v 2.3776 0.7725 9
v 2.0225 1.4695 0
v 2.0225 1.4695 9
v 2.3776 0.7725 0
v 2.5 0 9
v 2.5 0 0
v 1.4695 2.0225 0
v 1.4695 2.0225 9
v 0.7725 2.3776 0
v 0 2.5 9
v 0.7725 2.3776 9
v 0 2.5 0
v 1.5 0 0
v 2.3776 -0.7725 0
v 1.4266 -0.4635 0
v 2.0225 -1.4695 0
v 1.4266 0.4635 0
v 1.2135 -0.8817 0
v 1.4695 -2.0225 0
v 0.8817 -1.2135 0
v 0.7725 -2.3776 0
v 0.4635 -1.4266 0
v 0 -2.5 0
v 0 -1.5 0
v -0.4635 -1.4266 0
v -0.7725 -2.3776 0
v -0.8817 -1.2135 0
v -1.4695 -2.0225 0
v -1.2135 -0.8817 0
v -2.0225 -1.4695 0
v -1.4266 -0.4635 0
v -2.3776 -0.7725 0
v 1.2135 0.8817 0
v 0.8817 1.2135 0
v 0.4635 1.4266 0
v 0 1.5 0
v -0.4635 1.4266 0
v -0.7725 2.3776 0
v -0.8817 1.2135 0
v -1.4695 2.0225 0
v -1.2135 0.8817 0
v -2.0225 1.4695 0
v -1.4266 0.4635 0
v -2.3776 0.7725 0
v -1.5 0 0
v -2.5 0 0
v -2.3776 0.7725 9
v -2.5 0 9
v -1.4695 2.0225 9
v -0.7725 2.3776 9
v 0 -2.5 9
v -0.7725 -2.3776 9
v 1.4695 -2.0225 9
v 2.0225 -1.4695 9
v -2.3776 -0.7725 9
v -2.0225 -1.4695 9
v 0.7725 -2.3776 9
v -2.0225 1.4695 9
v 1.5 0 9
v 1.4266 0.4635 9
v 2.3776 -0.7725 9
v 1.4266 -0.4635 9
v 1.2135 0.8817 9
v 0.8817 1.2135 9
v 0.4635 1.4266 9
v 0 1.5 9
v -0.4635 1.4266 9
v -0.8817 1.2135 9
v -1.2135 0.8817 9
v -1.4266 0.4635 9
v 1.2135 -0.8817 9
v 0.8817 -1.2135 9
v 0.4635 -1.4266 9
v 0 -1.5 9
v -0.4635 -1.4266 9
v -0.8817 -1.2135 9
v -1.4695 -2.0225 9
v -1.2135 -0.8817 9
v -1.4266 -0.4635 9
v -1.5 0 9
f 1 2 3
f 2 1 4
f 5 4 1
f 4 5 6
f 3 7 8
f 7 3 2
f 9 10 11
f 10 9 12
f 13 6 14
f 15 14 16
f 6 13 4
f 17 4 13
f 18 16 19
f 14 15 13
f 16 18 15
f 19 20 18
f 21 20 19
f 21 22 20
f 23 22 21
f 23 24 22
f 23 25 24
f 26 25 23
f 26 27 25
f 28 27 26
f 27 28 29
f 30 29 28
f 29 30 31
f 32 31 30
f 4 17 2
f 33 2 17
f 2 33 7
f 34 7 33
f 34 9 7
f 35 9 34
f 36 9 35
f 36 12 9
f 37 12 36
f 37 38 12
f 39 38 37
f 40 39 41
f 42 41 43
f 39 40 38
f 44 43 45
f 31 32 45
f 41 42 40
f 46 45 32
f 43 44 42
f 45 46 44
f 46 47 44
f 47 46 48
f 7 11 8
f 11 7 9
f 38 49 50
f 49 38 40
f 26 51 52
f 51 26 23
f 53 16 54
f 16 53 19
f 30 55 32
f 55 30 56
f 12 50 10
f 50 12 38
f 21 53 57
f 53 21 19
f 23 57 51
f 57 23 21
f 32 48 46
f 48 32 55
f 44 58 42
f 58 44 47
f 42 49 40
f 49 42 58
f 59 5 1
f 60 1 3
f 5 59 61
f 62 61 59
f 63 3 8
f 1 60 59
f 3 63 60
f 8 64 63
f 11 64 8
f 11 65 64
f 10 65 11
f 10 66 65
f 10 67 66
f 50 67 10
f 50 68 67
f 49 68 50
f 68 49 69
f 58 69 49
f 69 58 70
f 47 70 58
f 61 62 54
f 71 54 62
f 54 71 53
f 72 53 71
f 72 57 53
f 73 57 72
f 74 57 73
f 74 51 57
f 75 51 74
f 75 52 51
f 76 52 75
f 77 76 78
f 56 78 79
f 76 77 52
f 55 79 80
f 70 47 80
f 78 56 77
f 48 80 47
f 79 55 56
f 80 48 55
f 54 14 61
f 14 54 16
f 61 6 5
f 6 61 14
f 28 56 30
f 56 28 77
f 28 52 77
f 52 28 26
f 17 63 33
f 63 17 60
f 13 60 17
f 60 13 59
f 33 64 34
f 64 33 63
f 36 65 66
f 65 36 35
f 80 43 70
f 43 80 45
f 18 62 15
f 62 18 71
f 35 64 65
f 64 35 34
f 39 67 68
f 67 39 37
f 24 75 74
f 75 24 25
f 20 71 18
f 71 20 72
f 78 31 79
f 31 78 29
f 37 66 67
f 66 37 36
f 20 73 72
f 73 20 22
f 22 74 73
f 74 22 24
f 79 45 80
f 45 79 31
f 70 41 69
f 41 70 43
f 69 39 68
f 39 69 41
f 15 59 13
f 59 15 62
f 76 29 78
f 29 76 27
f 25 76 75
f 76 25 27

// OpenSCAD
BASE_THICKNESS = 1;
PIMB_L = 85;
PIMB_W = 56.0;
PIMB_H = 1.45;
PIMB_R = 3;
PIMB_MARGINS = 3;
PIMB_SCREWS_POS = [
    [-PIMB_L / 2 + 22.5, -PIMB_W/2 + 3.5, [180]],
    [PIMB_L / 2 - 3.5, -PIMB_W/2 + 3.5, [180, 225, 270]],
    [-PIMB_L / 2 + 22.5, PIMB_W/2 - 3.5, [0]],
    [PIMB_L / 2 - 3.5, PIMB_W/2 - 3.5, [0, 315, 270]],
];
PIMB_CONNECTOR_HOLE = [
    // x, y, width, height
    [PIMB_L / 2 - 10.6, PIMB_W / 2, 10, 7],
    [-PIMB_L / 2, PIMB_W / 2 - 10.25, 16, 15],
];
PIMB_SCREWS_M = 2.5;
PIMB_SCREWS_LENGTH = BASE_THICKNESS * 5; // from outside of base
PIMB_NUT_HEIGHT = 1;
DIGIT_L = 25;
DIGIT_W = 18;
DIGIT_X = -27;
DIGIT_Y = 1.5;
DIGIT_SPACE = 1;
CAMERA_R = 7;
CAMERA_SPACE = 1;
CAMERA_X = 12;
CAMERA_Y = -17;
CAMERA_SCREWS_X = [21 / 2, -21 / 2];
CAMERA_SCREWS_Y = [13.5 / 2, -13.5 / 2];
CAMERA_SCREWS_LENGTH = 14.5; // from outside of base
CAMERA_NUT_HEIGHT = 1;
CAMERA_SCREWS_M = 2;

BOX_WALLS = 1;
BOX_RIDGE = 2;
BOX_HEIGHT = 39;

PIMB_UNDER_BOARD_SPACE = 3; // space for sunken screw heads
PIMB_SCREW_PADS_R = 3.5; // actually they're more like 3, but there is some extra space
PIMB_SCREW_HEAD_R = 2.7;
SCREW_HOLE_FACTOR = 1.2; // if screw is M2, make size of hole this much larger
BOX_NR_AIRHOLES_X = 4;
BOX_NR_AIRHOLES_Y = 5;
BOX_AIRHOLE_WIDTH = 3;
BOX_AIRHOLE_HEIGHT = 17;
BOX_AIRHOLE_MARGIN = 10;

SPACER_MB_POE_LENGTH = 15;
SPACER_POE_PROTO_LENGTH = 9;
TOP_TO_BOTTOM_HEIGHT = 28;

MAGNET_R = 7.5;
MAGNET_H = 2.2;
BOX_ROTATION_FROM_VERTICAL = 15;

$fn=20;
function enforce_3_vector(x) = is_list(x) ? x : [x, x, x];

module rounded_corner_cube(dimensions, r=0) {
    dimensions = enforce_3_vector(dimensions);
    r = enforce_3_vector(r);
    up(dimensions.z / 2) {
        minkowski() {
            cube(dimensions - 2 * r, center=true);
            scale(r) sphere(r=1);
        }
    }
}

module MB_no_holes () {
    linear_extrude(PIMB_H) {
        minkowski() {
            square([PIMB_L-2 * PIMB_R, PIMB_W - 2 * PIMB_R], center=true);
            circle(PIMB_R);
        }
    }
}
module MB() {
    difference() {
        MB_no_holes();
        repeat_for_MB_screw_positions() {
            down(1) cylinder(r=PIMB_SCREWS_M / 2, h=PIMB_H + 2);
        }
    }
}

module digit_cutout() {
    translate([DIGIT_X, DIGIT_Y, 0]) {
        cube([DIGIT_L + 2 * DIGIT_SPACE, DIGIT_W + 2 * DIGIT_SPACE, 3 * BASE_THICKNESS], center=true);
    }
}

module camera_cutout() {
    translate([CAMERA_X, CAMERA_Y, 0]) {
        cylinder(r=CAMERA_R + CAMERA_SPACE, h=3 * BASE_THICKNESS, center=true);
    }
}
module camera_screws() {
    translate([CAMERA_X, CAMERA_Y, 0]) {
        for(x=CAMERA_SCREWS_X, y=CAMERA_SCREWS_Y) {
            translate([x, y, 0]) {
                difference() {
                    cylinder(r=CAMERA_SCREWS_M * 1.1 + 1, h=CAMERA_SCREWS_LENGTH);
                    translate([0, 0, BASE_THICKNESS]) cylinder(r=CAMERA_SCREWS_M / 2, h=CAMERA_SCREWS_LENGTH);
                    translate([0, 0, CAMERA_SCREWS_LENGTH - 3 * CAMERA_NUT_HEIGHT]) cylinder(r=CAMERA_SCREWS_M * 1.1 , h=CAMERA_SCREWS_LENGTH, $fn=6);
                }
            }
        }
    }

}


module pimb_screws() {
    repeat_for_MB_screw_positions() {
        difference() {
            cylinder(r=PIMB_SCREWS_M * 1.1 + 1, h=PIMB_SCREWS_LENGTH);
            translate([0, 0, BASE_THICKNESS]) cylinder(r=PIMB_SCREWS_M / 2, h=PIMB_SCREWS_LENGTH);
            translate([0, 0, PIMB_SCREWS_LENGTH - 3 * PIMB_NUT_HEIGHT]) cylinder(r=PIMB_SCREWS_M * 1.1 , h=PIMB_SCREWS_LENGTH, $fn=6);
        }
    }
}

module base() {
    difference() {
        translate([0, 0, BASE_THICKNESS / 2]) {
            cube([400, 200, BASE_THICKNESS], center=true);
        }
        translate([0, -20, -BASE_THICKNESS]) linear_extrude(BASE_THICKNESS * 1.5) voncount();
        digit_cutout();
        camera_cutout();
    }
    camera_screws();
    pimb_screws();
}


module voncount() {
    scale(.1) import(file="voncount.svg", center=true);
}
/*
module hex_grid() {
    CELL_SIZE = 10;
    CELL_WALL_SIZE = 1;
    CELL_SPACE_Y = (CELL_SIZE *sqrt(3) / 2 + CELL_WALL_SIZE) / 2;
    CELL_SPACE_X = CELL_SPACE_Y * sqrt(3) * 2;
    GRID_HEIGHT = 2;
    for (x=[-1:1], y=[-6:6]) {
        x = x + (abs(y) % 2 - .5) / 2;
        translate([x * CELL_SPACE_X, y * CELL_SPACE_Y, 0]) {
            difference() {
                cylinder(r=CELL_SIZE / 2 + CELL_WALL_SIZE * sqrt(3), h=GRID_HEIGHT, $fn=6);
                translate([0, 0, -1]) cylinder(r=CELL_SIZE / 2, h=GRID_HEIGHT + 2, $fn=6);
            }
        }
    }
}
*/

module rotated_front() {
    translate([0, 0, -210]) {
        rotate(25, [0, 0, 1]) {
            rotate(-75, [1, 0, 0]) {
                translate([30, -150, -10]) {
                    union() {
                        translate([0, 0, BASE_THICKNESS * 3]) MB();
                        base();
                    }
                }
            }
        }
    }
}
module rotated_walls() {
    translate([-30, 150, 10]) {
        rotate(75, [1, 0, 0]) {
            rotate(-25, [0, 0, 1]) {
                translate([0, 0, 210]) {
                    translate([0, 0, 500]) cube(1000, center=true);
                    rotate(-90, [1, 0, 0]) translate([0, 0, 500]) cube(1000, center=true);
                    rotate(-90, [0, 1, 0]) translate([0, 0, 500]) cube(1000, center=true);
                }
            }
        }
    }
}

module corner_box() {
    difference() {
        union() {
            translate([0, 0, BASE_THICKNESS * .5]) MB();
            base();
        }
        rotated_walls();
    }
}

module down(z) {
    up(-z) children();
}

module up(z) {
    translate([0, 0, z]) children();
}

module spacers(h, m=2.5, count=4, distance = 0) {
    for (x=[0:count - 1]) {
        translate([x * (distance == 0 ? m * 2 : distance), 0, 0]) {
            difference() {
                cylinder(r=m * 1.2, h=h, $fn=6);
                down(1) cylinder(r=m/2*1.1, h=h + 2);
            }
        }
    }
}

module spacers_loose(h, m=2.5, count=4, distance = 0) {
    for (x=[0:count - 1]) {
        translate([x * (distance == 0 ? m * 2 : distance), 0, 0]) {
            difference() {
                cylinder(r=m, h=h);
                down(1) cylinder(r=m/2*1.2, h=h + 2);
            }
        }
    }
}

module repeat_for_MB_screw_positions() {
    for(x_y_rots=PIMB_SCREWS_POS) {
        x = x_y_rots[0];
        y = x_y_rots[1];
        for (rot=x_y_rots[2]) {
            translate([x, y, 0]) rotate([0, 0, rot]) children();
        }
    }
}

module make_MB_base_holes_and_support() {
    difference() {
        union() {
            children();
            repeat_for_MB_screw_positions() {
                translate([-PIMB_SCREW_PADS_R, 0, 0]) cube([PIMB_SCREW_PADS_R * 2, PIMB_SCREW_PADS_R * 2 + 10, BOX_WALLS + PIMB_UNDER_BOARD_SPACE]);
                cylinder(r=PIMB_SCREW_PADS_R, h=BOX_WALLS + PIMB_UNDER_BOARD_SPACE);
            }
        }
        repeat_for_MB_screw_positions() {
            down(BOX_WALLS) cylinder(r=PIMB_SCREW_HEAD_R, h=BOX_WALLS + PIMB_UNDER_BOARD_SPACE);
            cylinder(r=PIMB_SCREWS_M / 2 * SCREW_HOLE_FACTOR, h=BOX_WALLS + PIMB_UNDER_BOARD_SPACE + 1);
        }
    }
}

module cut_out_connector_holes() {
    difference() {
        children();
        for (x_y_w_h = PIMB_CONNECTOR_HOLE) {
            let (x = x_y_w_h[0], y=x_y_w_h[1], w=x_y_w_h[2], h=x_y_w_h[3]) {
                translate([x, y, BOX_WALLS + PIMB_UNDER_BOARD_SPACE]) rounded_corner_cube([w, w, h], r=.5);
            }
        }
    }
}

module cut_out_text() {
    difference() {
        children();
        linear_extrude(BOX_WALLS / 4) {
            scale([-1, 1, 1]) voncount();
            scale([-.7, .7, 1]) {
                translate([0, 18, 0]) text("Count von Count", halign="center");
                translate([0, -27, 0]) text("HS3.pl", halign="center");
            }
        }
    }
}

module BOX(offset, h=10, z_r=1) rounded_corner_cube([PIMB_L + 2 * offset + PIMB_MARGINS * 2, PIMB_W + 2 * offset + PIMB_MARGINS * 2, h ], [4 + offset, 4 + offset, z_r]);
module OUTER_BOX() BOX(BOX_WALLS, h=BOX_HEIGHT + BOX_WALLS * 2);
module INNER_BOX() up(BOX_WALLS) BOX(0, h=BOX_HEIGHT);

module pibox_holder() {
    render() {
        intersection() {
            up(500) cube(1000, center=true);  // only z > 0
            let (pad_size = (MAGNET_R + BOX_WALLS) * 2) {
                difference() {
                    union() {
                        translate([(PIMB_L / 2 + BOX_WALLS + PIMB_MARGINS), 0 , 0]) {
                            render() cut_out_connector_holes() translate([-PIMB_L / 2 - PIMB_MARGINS - BOX_WALLS + .45, 7, 0]) holder(110, 1);
                        }
                        magnet_holder_no_hole(-(53 - pad_size / 2), 30, pad_size);
                        magnet_holder_no_hole(57 + pad_size / 2, -60, pad_size);
                    }
                    magnet_holder_hole(-(53 - pad_size / 2), 30, pad_size);
                    magnet_holder_hole(57 + pad_size / 2, -60, pad_size);
                }
            }
        }
    }
}

module magnet_holder_no_hole(pos, rot, pad_size) {
    rotate(-BOX_ROTATION_FROM_VERTICAL, [0, 1, 0]) {
        translate([0, pos, 1.2]) up(pad_size / 2 + 1) rotate(rot, [1, 0, 0]) rotate(90, [0, 1, 0]) {
            rounded_corner_cube([pad_size,  pad_size, 1.5 * BOX_WALLS + MAGNET_H], [2, 2, 0]);
        }
    }
}
module magnet_holder_hole(pos, rot, pad_size) {
    rotate(-BOX_ROTATION_FROM_VERTICAL, [0, 1, 0]) {
        translate([0, pos, 1.2]) up(pad_size / 2 + 1) rotate(rot, [1, 0, 0]) rotate(90, [0, 1, 0]) {
            up(BOX_WALLS / 2) cylinder(r=MAGNET_R, h=MAGNET_H);
            up(BOX_WALLS) translate([-(pad_size + MAGNET_R / 4), 0, 0]) rounded_corner_cube([2 * pad_size, MAGNET_R * 2, 1.5 * BOX_WALLS + MAGNET_H], 0);
        }
    }
}

module pibox_bottom() {
    translate([(PIMB_L / 2 + BOX_WALLS + PIMB_MARGINS), 0 , 0])
        intersection() {
            OUTER_BOX();
            cut_out_text() cut_out_connector_holes() make_MB_base_holes_and_support() {
                difference() {
                    OUTER_BOX();
                    union() {
                        up(BOX_WALLS + PIMB_UNDER_BOARD_SPACE + PIMB_H) difference() {
                            up(100) cube(200, center=true);
                            down(1) BOX(BOX_WALLS / 2, h = BOX_RIDGE + 1, z_r=0);
                        }
                        INNER_BOX();
                        // up(BOX_WALLS*3) scale([1, 1, 10]) MB_no_holes();
                    }
                }
            }
        }
}

module holder(h, thickness = 0.5) {
    rotate(90, [1, 0, 0]) {
        translate([thickness / 2, thickness / 2, -h/2]) {
            linear_extrude(h) {
                minkowski() {
                    union() {
                        translate([-.005, -.005]) square([10, .01]);
                        rotate(90) polygon([[0, .5], [7.7, 2.57], [4, .5]]);
                    }
                    circle(r=thickness/2 - 0.001);
                }
            }
        }
    }
}


//pibox_bottom();
//pibox_holder();

module cut_text_and_voncount_bottom() {
    difference() {
        children();
        translate([5, 5, 0]) linear_extrude(BOX_WALLS / 4) scale([1.5, -1.5, 1]) rotate(90) voncount();
    }
}

module cut_display_and_camera_holes() {
    difference() {
        children();
        translate([DIGIT_X, DIGIT_Y, -1]) rounded_corner_cube([DIGIT_L + DIGIT_SPACE, DIGIT_W+ DIGIT_SPACE, 3 * BOX_WALLS], r=1);  // digit
        translate([CAMERA_X, CAMERA_Y, -1]) cylinder(r=CAMERA_R + CAMERA_SPACE, h=3 * BOX_WALLS);  // camera

    }
}

module cut_airholes() {
    difference() {
        children();
        for (nr=[0:BOX_NR_AIRHOLES_X - 1]) {
            x_offset = -PIMB_L / 2  + BOX_AIRHOLE_MARGIN;
            x = (PIMB_L / 2 - 2 * BOX_AIRHOLE_MARGIN) / (BOX_NR_AIRHOLES_X - 1) * nr + x_offset;
            translate([x, PIMB_W, 7]) rounded_corner_cube([BOX_AIRHOLE_WIDTH, PIMB_W, BOX_AIRHOLE_HEIGHT], r=BOX_AIRHOLE_WIDTH / 2.1);
            translate([x, -PIMB_W, 7]) rounded_corner_cube([BOX_AIRHOLE_WIDTH, PIMB_W, BOX_AIRHOLE_HEIGHT], r=BOX_AIRHOLE_WIDTH / 2.1);
        }
        for (nr=[0:BOX_NR_AIRHOLES_Y - 1]) {
            y_offset = -PIMB_W / 2  + BOX_AIRHOLE_MARGIN;
            y = (PIMB_W - 2 * BOX_AIRHOLE_MARGIN) / (BOX_NR_AIRHOLES_Y - 1) * nr + y_offset;
            translate([PIMB_L / 2, y, 7]) rounded_corner_cube([PIMB_L, BOX_AIRHOLE_WIDTH, BOX_AIRHOLE_HEIGHT], r=BOX_AIRHOLE_WIDTH / 2.1);
        }
    }
}

module make_top_screw_receivers() {
    difference() {
        union() {
            children();
            repeat_for_MB_screw_positions() {
                top_proto = BOX_WALLS + PIMB_UNDER_BOARD_SPACE + TOP_TO_BOTTOM_HEIGHT;
                height = BOX_HEIGHT + BOX_WALLS * 2 - top_proto;
                translate([-PIMB_SCREW_PADS_R, 0, top_proto]) cube([PIMB_SCREW_PADS_R * 2, PIMB_SCREW_PADS_R * 2 + 10, height]);
                translate([0, 0, top_proto]) cylinder(r=PIMB_SCREW_PADS_R, h=height);
            }
        }
        repeat_for_MB_screw_positions() {
            top_proto = BOX_WALLS + PIMB_UNDER_BOARD_SPACE + TOP_TO_BOTTOM_HEIGHT;
            height = BOX_HEIGHT + BOX_WALLS * 2 - top_proto;
            up(top_proto - BOX_WALLS) cylinder(r=PIMB_SCREW_HEAD_R, h=height);
            cylinder(r=PIMB_SCREWS_M / 2 * SCREW_HOLE_FACTOR, h=BOX_WALLS + PIMB_UNDER_BOARD_SPACE + 1);
        }
    }
}


module pibox_top() {
cut_text_and_voncount_bottom() cut_airholes() cut_display_and_camera_holes()
    translate([0, 0, BOX_HEIGHT + BOX_WALLS * 2]) {
        rotate(180, [1, 0, 0]) {
            intersection() {
                OUTER_BOX();
                make_top_screw_receivers() cut_out_connector_holes() {
                    intersection() {
                        difference() {
                            OUTER_BOX();
                            INNER_BOX();
                        }
                        union() {
                            up(BOX_WALLS + PIMB_UNDER_BOARD_SPACE + PIMB_H) difference() {
                                up(100) cube(200, center=true);
                                down(1) BOX(BOX_WALLS / 2, h = BOX_RIDGE + 1, z_r=0);
                            }
                            // up(BOX_WALLS*3) scale([1, 1, 10]) MB_no_holes();
                        }
                    }
                }
            }
        }
    }
}

// pibox_top();
spacers_loose(h=SPACER_POE_PROTO_LENGTH, m=2.5, count=1);
